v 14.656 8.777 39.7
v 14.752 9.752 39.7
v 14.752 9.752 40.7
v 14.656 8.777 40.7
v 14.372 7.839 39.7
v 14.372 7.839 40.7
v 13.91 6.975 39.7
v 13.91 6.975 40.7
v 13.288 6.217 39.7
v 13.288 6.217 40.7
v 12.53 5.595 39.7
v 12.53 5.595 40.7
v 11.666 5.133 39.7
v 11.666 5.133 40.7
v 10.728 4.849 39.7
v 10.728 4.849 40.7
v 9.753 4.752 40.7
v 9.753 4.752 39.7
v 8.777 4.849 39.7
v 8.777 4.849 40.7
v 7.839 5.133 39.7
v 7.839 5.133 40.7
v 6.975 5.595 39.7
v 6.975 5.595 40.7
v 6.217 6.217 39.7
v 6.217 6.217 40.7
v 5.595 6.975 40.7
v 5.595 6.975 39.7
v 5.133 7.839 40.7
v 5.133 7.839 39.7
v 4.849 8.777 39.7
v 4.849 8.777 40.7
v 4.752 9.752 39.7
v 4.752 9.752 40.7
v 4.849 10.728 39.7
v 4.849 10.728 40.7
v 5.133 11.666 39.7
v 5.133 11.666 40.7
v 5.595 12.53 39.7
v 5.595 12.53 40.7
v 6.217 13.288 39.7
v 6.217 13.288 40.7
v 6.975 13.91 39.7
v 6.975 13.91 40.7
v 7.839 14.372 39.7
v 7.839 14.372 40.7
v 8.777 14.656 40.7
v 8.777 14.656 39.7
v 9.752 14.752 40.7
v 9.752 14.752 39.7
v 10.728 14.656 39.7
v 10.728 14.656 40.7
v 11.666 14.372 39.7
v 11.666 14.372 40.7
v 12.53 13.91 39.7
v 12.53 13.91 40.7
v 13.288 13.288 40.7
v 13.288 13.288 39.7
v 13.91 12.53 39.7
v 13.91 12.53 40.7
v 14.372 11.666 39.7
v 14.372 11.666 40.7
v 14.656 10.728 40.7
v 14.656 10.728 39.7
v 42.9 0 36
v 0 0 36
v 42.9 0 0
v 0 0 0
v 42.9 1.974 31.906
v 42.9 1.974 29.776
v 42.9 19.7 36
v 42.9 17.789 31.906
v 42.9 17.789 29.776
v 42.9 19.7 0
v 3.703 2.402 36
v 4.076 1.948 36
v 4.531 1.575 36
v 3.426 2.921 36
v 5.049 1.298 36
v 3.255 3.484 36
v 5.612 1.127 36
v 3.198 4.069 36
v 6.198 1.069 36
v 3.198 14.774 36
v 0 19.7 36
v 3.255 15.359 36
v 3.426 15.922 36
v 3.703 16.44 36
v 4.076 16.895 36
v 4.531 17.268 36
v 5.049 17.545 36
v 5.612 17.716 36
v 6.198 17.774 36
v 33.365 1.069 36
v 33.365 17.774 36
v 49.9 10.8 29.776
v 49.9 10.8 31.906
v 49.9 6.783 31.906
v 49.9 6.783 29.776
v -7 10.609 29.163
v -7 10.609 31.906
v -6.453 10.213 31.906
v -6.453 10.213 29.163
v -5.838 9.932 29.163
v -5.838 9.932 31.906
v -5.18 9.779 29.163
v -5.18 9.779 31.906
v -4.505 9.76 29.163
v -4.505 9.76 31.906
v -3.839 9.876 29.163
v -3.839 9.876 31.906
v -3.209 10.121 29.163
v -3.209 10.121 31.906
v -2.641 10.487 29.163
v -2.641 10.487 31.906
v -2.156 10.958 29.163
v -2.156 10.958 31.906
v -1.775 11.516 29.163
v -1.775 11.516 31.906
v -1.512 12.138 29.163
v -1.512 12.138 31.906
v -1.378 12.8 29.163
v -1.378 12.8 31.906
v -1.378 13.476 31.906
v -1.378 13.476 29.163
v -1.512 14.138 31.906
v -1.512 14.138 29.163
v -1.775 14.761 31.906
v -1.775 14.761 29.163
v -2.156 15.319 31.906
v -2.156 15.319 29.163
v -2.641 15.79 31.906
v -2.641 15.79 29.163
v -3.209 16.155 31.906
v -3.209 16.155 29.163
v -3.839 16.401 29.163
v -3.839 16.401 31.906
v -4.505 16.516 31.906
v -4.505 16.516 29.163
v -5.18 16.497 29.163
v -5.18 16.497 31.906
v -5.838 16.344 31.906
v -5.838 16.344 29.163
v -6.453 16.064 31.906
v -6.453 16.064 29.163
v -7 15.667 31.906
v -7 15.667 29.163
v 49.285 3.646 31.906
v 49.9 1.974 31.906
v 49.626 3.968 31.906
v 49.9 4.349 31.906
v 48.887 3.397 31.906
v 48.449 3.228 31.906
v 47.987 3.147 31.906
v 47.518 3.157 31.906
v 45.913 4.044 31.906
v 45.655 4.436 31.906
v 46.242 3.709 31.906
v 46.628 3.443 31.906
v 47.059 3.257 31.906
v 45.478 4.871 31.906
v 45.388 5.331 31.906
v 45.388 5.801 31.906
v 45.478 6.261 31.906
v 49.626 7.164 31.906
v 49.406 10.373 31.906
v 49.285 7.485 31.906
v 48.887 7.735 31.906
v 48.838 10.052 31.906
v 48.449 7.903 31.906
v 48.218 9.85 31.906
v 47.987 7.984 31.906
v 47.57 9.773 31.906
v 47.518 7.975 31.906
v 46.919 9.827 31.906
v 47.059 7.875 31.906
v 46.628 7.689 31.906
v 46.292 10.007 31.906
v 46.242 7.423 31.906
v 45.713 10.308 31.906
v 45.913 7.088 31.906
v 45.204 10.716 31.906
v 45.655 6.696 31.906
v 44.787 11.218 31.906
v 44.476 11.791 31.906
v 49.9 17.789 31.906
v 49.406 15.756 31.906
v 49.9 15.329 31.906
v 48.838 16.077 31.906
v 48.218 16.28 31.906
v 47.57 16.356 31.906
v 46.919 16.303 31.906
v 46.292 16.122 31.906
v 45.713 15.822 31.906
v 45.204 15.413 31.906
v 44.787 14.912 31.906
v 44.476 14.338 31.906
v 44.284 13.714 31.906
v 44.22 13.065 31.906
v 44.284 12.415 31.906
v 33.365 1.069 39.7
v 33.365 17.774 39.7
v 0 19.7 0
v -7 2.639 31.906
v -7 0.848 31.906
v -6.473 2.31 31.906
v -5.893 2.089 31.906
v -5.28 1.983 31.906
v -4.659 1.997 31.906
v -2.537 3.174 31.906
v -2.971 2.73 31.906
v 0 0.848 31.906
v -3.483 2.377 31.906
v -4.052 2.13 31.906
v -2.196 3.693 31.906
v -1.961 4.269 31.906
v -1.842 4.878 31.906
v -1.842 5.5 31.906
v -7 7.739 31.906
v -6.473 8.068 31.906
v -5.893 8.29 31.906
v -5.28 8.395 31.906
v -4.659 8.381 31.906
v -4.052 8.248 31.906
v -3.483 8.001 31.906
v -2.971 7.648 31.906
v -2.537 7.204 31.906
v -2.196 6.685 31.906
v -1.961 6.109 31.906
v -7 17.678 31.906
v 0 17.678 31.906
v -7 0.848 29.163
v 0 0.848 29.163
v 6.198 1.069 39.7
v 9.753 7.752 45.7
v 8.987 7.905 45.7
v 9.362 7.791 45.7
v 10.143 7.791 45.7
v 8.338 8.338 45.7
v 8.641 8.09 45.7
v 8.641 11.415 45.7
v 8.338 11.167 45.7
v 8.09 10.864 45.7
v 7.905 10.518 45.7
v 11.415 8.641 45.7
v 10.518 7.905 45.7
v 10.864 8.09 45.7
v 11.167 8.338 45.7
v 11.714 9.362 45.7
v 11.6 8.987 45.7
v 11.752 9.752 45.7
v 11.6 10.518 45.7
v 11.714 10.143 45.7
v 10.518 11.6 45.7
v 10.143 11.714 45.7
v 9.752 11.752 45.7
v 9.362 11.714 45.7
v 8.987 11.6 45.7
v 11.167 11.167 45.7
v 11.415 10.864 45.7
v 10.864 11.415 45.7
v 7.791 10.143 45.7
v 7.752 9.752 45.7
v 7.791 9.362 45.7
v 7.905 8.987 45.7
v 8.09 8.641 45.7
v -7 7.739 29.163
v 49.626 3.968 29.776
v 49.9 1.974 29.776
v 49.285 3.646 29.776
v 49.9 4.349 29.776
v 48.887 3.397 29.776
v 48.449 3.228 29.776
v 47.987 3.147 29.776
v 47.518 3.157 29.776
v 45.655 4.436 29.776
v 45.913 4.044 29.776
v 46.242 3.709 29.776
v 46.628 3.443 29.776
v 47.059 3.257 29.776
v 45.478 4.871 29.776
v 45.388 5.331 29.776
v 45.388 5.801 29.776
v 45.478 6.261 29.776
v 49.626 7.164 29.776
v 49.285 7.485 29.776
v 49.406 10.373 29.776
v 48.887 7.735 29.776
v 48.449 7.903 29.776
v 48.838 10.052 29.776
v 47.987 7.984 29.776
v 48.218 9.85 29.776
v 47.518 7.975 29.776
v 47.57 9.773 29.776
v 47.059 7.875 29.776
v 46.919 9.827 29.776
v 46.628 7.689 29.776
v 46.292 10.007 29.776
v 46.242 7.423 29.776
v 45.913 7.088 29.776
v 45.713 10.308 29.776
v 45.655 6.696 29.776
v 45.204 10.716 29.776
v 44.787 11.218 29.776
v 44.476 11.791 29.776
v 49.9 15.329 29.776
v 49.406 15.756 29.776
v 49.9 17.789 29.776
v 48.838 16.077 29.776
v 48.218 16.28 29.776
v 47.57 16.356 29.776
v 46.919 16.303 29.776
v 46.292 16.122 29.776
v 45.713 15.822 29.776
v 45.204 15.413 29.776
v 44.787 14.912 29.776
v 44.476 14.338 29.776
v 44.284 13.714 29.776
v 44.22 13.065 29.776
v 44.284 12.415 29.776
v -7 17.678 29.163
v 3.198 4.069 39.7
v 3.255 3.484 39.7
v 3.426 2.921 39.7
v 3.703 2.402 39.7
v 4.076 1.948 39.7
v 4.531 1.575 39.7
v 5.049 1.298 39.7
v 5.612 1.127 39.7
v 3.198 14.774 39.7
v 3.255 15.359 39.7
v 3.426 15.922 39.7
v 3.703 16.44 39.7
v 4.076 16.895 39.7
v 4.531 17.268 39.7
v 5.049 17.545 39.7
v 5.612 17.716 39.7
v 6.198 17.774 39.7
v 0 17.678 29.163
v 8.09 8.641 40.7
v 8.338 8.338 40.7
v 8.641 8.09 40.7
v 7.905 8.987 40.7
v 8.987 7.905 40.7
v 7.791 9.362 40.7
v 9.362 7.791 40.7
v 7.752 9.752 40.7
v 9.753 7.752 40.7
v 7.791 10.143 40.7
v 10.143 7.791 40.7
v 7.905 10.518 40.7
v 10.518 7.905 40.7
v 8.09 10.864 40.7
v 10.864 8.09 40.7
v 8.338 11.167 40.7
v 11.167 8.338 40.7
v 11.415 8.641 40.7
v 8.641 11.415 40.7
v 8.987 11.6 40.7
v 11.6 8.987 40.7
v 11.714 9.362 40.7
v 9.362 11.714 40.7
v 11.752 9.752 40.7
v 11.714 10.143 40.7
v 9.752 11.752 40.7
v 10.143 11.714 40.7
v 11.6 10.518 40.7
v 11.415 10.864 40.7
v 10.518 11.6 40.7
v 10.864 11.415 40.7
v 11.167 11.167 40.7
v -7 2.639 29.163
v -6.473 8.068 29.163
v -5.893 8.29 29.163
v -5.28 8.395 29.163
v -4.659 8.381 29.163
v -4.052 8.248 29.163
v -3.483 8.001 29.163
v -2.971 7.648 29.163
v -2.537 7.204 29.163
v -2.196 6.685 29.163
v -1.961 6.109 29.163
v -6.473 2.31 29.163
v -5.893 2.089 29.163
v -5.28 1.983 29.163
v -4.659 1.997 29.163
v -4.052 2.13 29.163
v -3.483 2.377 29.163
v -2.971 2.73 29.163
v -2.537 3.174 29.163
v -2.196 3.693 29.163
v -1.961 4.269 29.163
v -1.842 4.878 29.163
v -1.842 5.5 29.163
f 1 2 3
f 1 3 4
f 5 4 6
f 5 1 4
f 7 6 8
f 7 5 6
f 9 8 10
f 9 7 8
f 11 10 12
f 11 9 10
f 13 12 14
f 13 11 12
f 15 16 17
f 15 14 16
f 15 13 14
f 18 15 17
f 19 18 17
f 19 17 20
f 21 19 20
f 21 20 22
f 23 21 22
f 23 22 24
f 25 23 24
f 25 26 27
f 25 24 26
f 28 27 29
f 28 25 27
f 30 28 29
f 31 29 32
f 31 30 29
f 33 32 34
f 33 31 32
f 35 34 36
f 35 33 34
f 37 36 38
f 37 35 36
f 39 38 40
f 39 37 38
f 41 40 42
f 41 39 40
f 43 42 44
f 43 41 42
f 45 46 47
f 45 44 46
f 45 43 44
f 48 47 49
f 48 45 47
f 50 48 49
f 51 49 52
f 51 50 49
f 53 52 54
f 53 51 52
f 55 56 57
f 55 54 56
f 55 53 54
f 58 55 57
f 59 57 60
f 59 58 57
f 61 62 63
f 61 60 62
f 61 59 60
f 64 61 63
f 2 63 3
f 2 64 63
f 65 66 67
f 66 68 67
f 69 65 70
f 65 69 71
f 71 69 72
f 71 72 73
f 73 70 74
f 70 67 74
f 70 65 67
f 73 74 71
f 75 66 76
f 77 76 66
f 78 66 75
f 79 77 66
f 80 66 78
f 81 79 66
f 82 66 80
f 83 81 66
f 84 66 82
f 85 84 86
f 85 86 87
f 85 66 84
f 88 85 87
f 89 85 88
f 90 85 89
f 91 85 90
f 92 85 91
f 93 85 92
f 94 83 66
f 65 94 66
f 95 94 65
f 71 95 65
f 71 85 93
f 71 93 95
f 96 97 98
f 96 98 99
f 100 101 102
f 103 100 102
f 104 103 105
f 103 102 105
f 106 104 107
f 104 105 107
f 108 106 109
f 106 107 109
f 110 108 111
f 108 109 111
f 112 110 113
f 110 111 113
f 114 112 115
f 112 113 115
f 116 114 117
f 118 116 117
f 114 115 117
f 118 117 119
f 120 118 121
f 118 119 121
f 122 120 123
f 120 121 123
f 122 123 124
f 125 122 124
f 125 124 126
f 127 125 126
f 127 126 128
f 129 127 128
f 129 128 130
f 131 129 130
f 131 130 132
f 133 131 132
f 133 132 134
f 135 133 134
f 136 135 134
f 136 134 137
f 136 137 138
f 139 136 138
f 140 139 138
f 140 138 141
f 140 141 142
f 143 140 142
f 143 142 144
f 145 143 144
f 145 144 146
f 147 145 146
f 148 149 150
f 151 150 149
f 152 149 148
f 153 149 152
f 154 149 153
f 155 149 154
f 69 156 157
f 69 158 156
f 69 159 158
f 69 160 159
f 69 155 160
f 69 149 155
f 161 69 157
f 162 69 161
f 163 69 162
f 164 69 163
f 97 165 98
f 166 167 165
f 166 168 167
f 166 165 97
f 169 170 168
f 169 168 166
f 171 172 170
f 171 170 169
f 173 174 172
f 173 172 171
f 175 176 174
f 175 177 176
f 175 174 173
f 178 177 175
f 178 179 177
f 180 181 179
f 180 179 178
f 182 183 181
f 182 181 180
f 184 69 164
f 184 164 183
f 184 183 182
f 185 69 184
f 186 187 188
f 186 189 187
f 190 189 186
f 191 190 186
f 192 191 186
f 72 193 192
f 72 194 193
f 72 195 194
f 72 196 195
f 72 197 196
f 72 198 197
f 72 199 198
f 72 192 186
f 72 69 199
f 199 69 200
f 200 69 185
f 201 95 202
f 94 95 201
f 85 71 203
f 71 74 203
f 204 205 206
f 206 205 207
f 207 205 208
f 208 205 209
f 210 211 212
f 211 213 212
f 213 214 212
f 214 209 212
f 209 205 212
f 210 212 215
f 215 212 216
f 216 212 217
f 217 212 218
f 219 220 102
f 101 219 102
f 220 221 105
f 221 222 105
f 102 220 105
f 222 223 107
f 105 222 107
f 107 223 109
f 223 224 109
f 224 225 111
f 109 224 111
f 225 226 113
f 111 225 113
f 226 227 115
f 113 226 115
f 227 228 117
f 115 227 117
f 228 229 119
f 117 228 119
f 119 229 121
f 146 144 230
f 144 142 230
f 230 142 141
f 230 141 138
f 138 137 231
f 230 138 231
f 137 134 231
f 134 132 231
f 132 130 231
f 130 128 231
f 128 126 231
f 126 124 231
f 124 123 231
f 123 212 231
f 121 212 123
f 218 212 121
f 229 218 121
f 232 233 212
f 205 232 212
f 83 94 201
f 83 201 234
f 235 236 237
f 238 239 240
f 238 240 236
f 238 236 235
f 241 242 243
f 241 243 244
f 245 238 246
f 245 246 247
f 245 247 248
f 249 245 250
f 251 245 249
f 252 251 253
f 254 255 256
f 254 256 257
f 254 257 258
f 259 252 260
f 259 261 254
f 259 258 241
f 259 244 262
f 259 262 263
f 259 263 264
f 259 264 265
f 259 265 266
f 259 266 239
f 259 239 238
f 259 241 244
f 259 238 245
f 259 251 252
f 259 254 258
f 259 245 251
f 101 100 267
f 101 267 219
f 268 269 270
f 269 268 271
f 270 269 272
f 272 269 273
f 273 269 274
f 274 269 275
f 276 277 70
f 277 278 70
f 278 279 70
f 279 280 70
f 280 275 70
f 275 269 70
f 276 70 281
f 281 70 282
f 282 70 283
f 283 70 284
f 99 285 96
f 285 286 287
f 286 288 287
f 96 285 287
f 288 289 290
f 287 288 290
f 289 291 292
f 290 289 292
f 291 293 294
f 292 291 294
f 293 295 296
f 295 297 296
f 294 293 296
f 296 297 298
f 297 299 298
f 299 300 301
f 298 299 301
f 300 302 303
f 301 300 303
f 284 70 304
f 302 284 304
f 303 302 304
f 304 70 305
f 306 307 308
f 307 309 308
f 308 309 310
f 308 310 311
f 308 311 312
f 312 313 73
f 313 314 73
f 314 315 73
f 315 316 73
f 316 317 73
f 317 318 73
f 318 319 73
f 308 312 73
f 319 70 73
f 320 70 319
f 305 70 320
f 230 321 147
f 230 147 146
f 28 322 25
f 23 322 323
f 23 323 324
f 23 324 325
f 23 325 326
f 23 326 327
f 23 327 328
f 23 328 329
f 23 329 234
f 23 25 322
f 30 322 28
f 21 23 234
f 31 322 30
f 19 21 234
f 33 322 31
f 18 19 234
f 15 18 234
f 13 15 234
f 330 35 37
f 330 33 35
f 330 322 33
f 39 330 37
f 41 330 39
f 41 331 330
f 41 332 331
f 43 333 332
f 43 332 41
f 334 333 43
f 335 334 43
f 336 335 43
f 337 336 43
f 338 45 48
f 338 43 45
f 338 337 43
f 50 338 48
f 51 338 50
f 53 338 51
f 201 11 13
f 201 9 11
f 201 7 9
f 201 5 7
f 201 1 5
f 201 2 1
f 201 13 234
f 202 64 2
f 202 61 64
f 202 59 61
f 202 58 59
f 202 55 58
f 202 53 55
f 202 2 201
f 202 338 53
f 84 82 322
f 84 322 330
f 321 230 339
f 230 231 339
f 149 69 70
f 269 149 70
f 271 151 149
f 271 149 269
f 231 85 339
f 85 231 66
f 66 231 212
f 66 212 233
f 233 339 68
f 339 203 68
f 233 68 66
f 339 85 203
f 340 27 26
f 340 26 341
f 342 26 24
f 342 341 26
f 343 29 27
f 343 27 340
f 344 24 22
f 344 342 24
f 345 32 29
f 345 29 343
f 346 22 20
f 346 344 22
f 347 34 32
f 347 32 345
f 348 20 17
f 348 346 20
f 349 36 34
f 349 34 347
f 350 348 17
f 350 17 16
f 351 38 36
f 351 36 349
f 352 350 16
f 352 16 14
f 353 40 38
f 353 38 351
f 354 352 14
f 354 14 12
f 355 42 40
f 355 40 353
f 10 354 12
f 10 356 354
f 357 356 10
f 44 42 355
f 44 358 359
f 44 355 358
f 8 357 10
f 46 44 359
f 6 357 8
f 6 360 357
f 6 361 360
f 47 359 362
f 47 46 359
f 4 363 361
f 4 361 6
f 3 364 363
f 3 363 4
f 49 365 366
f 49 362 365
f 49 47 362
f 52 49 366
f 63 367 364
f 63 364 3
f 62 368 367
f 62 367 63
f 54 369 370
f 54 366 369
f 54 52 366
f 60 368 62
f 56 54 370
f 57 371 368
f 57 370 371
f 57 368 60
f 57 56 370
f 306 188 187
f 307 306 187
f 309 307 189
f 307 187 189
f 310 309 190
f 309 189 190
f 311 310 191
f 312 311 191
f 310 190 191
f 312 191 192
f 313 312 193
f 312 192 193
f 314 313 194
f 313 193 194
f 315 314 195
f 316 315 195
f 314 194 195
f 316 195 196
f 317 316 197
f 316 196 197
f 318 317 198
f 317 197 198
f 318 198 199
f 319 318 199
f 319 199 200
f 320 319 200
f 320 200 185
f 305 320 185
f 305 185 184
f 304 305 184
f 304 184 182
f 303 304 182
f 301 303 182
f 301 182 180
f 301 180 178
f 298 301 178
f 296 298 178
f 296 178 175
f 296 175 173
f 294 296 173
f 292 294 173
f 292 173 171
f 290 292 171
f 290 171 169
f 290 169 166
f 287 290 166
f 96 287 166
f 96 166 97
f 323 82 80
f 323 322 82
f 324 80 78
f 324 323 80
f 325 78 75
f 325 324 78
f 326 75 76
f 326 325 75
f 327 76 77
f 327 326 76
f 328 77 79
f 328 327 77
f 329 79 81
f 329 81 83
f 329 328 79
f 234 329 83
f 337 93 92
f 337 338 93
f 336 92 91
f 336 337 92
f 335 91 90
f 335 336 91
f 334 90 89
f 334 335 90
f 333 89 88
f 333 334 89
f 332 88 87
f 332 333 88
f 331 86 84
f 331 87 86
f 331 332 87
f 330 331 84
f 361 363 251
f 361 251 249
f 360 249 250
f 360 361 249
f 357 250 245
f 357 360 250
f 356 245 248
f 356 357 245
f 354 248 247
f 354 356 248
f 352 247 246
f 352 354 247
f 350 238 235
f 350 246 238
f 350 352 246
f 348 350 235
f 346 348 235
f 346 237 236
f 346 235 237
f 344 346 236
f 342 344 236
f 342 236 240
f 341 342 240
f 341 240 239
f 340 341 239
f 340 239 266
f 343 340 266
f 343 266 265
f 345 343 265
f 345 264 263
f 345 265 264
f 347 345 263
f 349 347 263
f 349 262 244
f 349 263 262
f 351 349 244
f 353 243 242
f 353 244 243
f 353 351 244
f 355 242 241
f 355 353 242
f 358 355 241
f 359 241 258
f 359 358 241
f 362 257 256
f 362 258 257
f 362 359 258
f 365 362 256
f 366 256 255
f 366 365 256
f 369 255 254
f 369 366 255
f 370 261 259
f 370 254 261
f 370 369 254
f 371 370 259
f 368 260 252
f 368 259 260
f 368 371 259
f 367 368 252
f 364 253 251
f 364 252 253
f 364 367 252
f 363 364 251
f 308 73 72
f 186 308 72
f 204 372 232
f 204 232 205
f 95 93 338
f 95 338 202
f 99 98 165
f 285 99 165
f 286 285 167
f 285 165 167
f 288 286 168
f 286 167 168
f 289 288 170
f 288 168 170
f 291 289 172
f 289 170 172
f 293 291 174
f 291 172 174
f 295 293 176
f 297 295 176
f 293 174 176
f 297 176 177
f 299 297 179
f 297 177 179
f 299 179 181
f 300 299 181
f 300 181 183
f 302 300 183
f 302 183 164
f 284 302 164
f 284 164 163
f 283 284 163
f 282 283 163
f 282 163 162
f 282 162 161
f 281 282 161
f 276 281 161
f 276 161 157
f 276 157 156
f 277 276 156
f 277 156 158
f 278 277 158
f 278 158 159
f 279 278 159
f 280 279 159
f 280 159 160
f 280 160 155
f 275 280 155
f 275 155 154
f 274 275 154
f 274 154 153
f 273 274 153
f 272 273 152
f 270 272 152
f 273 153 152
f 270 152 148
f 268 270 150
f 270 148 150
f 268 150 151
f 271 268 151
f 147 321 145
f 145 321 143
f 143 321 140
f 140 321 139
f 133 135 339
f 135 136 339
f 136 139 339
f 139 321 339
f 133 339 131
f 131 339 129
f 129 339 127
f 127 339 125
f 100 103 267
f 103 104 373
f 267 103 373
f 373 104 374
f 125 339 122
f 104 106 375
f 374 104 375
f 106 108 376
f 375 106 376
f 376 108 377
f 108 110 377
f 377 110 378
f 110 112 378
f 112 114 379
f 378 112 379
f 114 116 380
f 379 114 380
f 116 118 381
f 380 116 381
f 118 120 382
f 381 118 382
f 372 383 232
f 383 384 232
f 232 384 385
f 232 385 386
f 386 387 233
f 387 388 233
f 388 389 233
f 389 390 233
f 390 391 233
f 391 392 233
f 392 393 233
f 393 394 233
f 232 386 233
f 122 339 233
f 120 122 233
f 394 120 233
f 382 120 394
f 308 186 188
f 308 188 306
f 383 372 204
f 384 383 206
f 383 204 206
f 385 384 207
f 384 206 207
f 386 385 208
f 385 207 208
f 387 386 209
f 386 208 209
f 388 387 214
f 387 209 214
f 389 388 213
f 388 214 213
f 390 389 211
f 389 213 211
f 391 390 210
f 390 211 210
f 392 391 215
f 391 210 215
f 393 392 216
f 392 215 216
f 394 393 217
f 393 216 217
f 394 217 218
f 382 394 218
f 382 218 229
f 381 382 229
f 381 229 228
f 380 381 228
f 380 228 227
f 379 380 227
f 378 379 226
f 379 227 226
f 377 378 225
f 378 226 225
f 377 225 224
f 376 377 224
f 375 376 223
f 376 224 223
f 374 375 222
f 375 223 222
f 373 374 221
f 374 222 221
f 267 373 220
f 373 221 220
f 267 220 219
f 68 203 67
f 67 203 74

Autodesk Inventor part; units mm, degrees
ref_plane "YZ Plane" through (0, 0, 0) normal (1, 0, 0) x (0, 1, 0)
ref_plane "XZ Plane" through (0, 0, 0) normal (0, 1, 0) x (-1, 0, 0)
ref_plane "XY Plane" through (0, 0, 0) normal (0, 0, 1) x (1, 0, 0)
sketch "Sketch1" plane through (0, 0, 0) normal (0, 0, 1) x (1, 0, 0)
  line L0 (0, 0) -> (42.9, 0)
  line L1 (42.9, 0) -> (42.9, 19.7)
  line L2 (42.9, 19.7) -> (0, 19.7)
  line L3 (0, 19.7) -> (0, 0)
  dimension "d0" = 42.9
  dimension "d1" = 19.7
extrude "Extrusion1" add sketch "Sketch1" along normal blind 36
sketch "Sketch2" plane through (0, 0, 36) normal (0, 0, 1) x (1, 0, 0)
  line L0 (3.1975, 17.7737) -> (33.3653, 17.7737)
  line L1 (33.3653, 17.7737) -> (33.3653, 1.0692)
  line L2 (33.3653, 1.0692) -> (3.1975, 1.0692)
  line L3 (3.1975, 1.0692) -> (3.1975, 17.7737)
  point P0 (0, 0)
extrude "Extrusion2" add sketch "Sketch2" along normal blind 3.7
fillet "Fillet1" radius 3 1 edges at (3.1975, 1.0692, 37.85)
fillet "Fillet2" radius 3 1 edges at (3.1975, 17.7737, 37.85)
sketch "Sketch3" plane through (0, 0, 39.7) normal (0, 0, 1) x (1, 0, 0)
  circle A0 centre (9.7525, 9.7525) radius 5
  point P0 (0, 0)
  dimension "d8" = 10
extrude "Extrusion3" add sketch "Sketch3" along normal blind 1
sketch "Sketch4" plane through (9.7525, 9.7525, 40.7) normal (0, 0, 1) x (1, 0, 0)
  circle A0 centre (0, 0) radius 2
  point P0 (-9.7525, -9.7525)
  dimension "d11" = 4
extrude "Extrusion4" add sketch "Sketch4" along normal blind 5
sketch "Sketch5" plane through (0, 0, 0) normal (-1, 0, 0) x (0, 0, 1)
  line L0 (31.9055, 17.6776) -> (29.163, 17.6776)
  line L1 (29.163, 17.6776) -> (29.163, 0.8485)
  line L2 (29.163, 0.8485) -> (31.9055, 0.8485)
  line L3 (31.9055, 0.8485) -> (31.9055, 17.6776)
  point P0 (0, 0)
extrude "Extrusion5" add sketch "Sketch5" along normal blind 7
sketch "Sketch6" plane through (0, 0.8485, 31.9055) normal (0, 0, 1) x (1, 0, 0)
  circle A0 centre (-4.7474, 12.2898) radius 3.3866
  point P0 (0, -0.8485)
extrude "Extrusion6" cut sketch "Sketch6" against normal through all
sketch "Sketch7" plane through (0, 0.8485, 31.9055) normal (0, 0, 1) x (1, 0, 0)
  circle A0 centre (-5.0418, 4.3406) radius 3.2151
  point P0 (0, -0.8485)
extrude "Extrusion7" cut sketch "Sketch7" against normal blind 7
sketch "Sketch8" plane through (42.9, 0, 0) normal (1, 0, 0) x (0, 0, -1)
  line L0 (-31.9055, 1.974) -> (-31.9055, 8.4041) projected
  line L1 (-31.9055, 1.974) -> (-29.7764, 1.974)
  line L2 (-29.7764, 1.974) -> (-29.7764, 17.7891)
  line L3 (-29.7764, 17.7891) -> (-31.9055, 17.7891)
  line L4 (-31.9055, 17.7891) -> (-31.9055, 1.974)
  point P0 (0, 0)
  point P1 (-31.9055, 7.739)
  point P2 (-31.9055, 2.6391)
extrude "Extrusion8" add sketch "Sketch8" along normal blind 7
sketch "Sketch9" plane through (42.9, 1.974, 31.9055) normal (0, 0, 1) x (1, 0, 0)
  circle A0 centre (4.9018, 3.5919) radius 2.4255
  point P0 (-42.9, -1.974)
extrude "Extrusion9" cut sketch "Sketch9" against normal blind 7
sketch "Sketch10" plane through (42.9, 1.974, 31.9055) normal (0, 0, 1) x (1, 0, 0)
  circle A0 centre (4.6112, 11.0906) radius 3.2917
  point P0 (-42.9, -1.974)
extrude "Extrusion10" cut sketch "Sketch10" against normal blind 7
sketch "Sketch11" plane through (0, 0, 36) normal (0, 0, 1) x (1, 0, 0)
  point P0 (0, 0)
properties part number "sorting"
